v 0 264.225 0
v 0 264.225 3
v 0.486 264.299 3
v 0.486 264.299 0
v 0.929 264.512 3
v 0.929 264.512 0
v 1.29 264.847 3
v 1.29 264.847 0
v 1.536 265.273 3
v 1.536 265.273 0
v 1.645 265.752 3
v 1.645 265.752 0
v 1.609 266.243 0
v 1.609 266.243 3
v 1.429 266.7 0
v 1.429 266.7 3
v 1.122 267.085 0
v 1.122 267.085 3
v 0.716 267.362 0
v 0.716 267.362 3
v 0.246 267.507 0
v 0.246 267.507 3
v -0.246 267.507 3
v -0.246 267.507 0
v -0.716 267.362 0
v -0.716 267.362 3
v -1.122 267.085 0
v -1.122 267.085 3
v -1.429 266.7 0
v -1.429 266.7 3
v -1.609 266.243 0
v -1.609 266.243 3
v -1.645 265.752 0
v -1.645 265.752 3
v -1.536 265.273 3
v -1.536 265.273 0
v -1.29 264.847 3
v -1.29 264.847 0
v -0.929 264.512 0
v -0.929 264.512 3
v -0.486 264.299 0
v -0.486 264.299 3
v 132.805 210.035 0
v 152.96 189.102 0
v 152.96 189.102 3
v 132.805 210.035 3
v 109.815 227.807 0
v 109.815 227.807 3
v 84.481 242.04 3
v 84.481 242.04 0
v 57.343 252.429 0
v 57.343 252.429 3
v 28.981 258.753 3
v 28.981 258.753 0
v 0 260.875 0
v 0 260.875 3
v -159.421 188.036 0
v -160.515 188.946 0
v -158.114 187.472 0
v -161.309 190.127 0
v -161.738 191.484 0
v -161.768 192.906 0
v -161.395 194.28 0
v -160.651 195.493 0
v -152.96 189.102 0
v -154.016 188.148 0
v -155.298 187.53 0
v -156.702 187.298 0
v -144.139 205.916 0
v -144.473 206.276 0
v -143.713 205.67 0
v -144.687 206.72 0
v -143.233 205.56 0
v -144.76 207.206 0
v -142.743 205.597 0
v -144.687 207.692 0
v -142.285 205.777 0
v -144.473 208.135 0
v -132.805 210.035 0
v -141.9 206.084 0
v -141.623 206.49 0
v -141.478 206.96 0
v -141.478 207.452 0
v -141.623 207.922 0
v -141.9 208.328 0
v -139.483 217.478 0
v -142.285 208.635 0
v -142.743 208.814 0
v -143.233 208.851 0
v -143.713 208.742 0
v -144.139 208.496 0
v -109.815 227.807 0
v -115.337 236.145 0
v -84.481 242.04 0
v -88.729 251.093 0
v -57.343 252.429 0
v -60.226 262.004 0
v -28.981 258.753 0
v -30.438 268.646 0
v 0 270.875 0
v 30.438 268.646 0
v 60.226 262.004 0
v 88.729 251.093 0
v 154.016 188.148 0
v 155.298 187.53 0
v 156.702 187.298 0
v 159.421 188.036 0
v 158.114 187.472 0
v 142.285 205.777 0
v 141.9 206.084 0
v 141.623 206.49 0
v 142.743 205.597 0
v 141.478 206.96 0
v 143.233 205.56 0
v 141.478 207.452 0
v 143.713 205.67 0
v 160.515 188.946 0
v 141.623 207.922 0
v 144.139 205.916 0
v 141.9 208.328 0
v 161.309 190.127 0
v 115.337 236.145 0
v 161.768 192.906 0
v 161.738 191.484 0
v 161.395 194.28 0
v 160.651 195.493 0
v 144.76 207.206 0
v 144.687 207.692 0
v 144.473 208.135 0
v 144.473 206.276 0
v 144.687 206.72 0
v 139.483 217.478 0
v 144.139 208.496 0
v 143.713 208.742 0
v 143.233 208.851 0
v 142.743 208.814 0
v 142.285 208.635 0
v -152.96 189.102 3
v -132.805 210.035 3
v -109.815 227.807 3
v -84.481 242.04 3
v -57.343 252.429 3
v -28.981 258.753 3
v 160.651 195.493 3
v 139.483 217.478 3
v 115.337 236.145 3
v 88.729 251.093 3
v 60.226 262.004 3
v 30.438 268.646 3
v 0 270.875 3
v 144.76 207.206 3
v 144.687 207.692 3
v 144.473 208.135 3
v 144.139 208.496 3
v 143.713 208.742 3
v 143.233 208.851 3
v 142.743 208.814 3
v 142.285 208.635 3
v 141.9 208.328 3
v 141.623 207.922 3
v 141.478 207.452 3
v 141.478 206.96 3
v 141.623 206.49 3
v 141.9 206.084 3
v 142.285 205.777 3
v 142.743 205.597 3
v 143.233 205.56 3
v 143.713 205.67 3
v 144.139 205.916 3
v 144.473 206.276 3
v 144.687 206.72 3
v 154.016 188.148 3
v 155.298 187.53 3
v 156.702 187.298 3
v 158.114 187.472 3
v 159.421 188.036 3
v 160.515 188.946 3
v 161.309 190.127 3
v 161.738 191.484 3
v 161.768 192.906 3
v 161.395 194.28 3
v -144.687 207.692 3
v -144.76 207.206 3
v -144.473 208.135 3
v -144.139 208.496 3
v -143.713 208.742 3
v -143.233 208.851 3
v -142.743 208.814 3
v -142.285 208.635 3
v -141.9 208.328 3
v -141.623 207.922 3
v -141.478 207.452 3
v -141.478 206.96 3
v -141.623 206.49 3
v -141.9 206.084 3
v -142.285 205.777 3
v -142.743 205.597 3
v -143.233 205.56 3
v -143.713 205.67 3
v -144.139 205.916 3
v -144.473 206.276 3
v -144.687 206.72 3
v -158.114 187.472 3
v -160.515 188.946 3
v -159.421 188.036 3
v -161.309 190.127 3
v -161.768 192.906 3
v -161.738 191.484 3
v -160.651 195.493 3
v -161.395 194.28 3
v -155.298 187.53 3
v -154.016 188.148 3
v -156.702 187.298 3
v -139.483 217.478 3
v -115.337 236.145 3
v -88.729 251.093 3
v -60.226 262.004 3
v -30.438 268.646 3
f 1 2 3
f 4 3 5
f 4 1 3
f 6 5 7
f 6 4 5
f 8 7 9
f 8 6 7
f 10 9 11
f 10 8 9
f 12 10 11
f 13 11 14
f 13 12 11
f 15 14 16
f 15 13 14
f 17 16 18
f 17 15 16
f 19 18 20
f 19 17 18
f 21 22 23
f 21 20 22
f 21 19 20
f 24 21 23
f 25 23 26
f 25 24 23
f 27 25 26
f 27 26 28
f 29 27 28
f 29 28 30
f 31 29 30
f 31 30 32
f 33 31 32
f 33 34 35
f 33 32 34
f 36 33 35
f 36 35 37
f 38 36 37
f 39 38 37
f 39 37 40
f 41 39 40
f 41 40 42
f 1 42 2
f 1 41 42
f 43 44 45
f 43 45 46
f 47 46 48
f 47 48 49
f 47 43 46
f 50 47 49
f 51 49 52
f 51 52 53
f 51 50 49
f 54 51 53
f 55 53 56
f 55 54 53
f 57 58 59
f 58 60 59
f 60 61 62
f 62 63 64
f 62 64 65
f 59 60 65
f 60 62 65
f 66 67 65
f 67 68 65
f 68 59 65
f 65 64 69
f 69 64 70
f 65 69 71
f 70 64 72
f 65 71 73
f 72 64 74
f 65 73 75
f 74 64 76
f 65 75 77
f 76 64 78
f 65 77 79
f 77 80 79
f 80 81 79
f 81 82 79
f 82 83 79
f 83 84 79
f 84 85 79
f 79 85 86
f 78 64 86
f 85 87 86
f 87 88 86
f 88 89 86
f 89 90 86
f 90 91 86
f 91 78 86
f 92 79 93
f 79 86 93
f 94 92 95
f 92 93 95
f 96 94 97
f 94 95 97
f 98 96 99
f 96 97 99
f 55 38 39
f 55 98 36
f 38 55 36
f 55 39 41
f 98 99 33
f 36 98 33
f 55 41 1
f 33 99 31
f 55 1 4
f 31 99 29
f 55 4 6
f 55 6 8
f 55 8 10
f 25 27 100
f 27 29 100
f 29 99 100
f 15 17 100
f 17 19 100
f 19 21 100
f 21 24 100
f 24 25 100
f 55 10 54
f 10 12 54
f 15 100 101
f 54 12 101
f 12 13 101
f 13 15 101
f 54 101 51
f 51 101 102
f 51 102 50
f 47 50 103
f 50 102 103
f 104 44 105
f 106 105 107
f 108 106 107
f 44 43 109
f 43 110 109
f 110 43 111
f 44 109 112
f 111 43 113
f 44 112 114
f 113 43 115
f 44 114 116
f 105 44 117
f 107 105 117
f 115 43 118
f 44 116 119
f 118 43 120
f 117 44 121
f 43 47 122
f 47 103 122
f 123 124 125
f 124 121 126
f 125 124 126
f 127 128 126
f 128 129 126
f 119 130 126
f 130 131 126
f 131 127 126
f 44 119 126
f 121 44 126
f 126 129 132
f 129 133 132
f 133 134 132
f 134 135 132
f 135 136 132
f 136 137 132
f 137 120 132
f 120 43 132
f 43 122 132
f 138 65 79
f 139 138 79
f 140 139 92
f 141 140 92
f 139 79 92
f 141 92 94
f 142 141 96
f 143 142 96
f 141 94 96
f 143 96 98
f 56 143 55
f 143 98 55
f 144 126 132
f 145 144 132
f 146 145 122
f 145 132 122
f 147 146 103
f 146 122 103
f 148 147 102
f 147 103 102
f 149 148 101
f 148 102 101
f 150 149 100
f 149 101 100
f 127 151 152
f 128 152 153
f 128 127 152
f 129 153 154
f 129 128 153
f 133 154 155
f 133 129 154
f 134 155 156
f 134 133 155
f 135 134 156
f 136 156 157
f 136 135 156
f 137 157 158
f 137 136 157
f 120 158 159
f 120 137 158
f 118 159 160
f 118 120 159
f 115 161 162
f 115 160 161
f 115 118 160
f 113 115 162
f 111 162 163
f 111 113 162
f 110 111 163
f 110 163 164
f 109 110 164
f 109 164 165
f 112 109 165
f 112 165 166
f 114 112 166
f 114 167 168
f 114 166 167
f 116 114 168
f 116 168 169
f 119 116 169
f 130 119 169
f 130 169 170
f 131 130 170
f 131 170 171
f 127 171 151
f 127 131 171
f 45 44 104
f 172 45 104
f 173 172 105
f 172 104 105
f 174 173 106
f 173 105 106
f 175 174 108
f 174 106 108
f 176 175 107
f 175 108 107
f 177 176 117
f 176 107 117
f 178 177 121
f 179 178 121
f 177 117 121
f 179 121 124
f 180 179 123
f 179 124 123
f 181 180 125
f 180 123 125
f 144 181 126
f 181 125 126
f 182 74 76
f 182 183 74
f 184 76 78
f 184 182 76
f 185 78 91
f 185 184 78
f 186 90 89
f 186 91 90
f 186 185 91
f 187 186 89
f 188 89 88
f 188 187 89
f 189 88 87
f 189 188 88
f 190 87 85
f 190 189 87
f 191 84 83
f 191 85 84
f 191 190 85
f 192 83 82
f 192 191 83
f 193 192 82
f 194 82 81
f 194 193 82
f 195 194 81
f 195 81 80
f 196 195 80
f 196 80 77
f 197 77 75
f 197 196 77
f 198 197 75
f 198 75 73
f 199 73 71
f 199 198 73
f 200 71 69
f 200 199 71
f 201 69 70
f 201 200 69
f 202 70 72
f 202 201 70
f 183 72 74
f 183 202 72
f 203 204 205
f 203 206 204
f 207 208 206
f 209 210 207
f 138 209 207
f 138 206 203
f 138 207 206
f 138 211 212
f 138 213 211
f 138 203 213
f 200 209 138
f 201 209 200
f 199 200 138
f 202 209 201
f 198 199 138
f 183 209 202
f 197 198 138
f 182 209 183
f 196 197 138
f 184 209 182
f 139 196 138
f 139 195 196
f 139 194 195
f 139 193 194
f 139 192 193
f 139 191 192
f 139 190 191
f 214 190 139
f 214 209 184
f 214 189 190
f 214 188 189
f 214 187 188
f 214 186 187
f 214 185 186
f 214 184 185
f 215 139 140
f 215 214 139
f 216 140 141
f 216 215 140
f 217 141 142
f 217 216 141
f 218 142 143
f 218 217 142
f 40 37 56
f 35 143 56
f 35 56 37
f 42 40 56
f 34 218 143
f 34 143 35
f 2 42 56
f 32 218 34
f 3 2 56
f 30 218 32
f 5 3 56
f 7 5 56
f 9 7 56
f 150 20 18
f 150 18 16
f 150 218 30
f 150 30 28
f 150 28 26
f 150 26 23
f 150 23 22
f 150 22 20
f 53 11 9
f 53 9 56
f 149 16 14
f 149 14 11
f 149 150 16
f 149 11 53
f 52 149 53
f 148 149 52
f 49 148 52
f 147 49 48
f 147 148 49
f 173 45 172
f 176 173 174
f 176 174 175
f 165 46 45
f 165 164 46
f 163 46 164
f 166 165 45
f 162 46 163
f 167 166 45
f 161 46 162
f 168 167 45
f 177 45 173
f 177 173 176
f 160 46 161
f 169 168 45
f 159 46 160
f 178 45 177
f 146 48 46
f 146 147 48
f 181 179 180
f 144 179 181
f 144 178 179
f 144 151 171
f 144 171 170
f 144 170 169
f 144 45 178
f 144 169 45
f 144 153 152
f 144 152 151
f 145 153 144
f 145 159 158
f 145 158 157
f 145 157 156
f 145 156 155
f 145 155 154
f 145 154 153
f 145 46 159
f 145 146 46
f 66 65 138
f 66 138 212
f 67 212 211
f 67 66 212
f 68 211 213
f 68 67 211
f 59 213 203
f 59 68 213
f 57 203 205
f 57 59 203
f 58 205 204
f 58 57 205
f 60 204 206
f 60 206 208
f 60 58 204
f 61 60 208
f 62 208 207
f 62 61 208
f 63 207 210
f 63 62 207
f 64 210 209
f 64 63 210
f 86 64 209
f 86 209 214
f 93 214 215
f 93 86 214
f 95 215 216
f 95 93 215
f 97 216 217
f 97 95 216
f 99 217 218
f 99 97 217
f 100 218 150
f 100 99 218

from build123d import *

# Parameters (mm, degrees)
PAD014_DEPTH                        = 3
SKETCH055_R                         = 1.65
POCKET019_DEPTH                     = 364.282338
POCKET019_DEPTH_BACK                = 367.282338
BODY001003005003003_PLACEMENT_ANGLE = 60
CLONE021_PLACEMENT_ANGLE            = 60


with BuildPart() as part:
    # Sketch052 → Pad014 (new body)
    with BuildSketch(Plane.XY):
        with BuildLine():
            ThreePointArc((152.959511, 127.101705), (84.480895, 180.040089), (0, 198.875477))
            Line((0, 198.875477), (0, 208.875477))
            ThreePointArc((160.650731, 133.492724), (88.728824, 189.092995), (0, 208.875477))
            ThreePointArc((152.959511, 127.101705), (160.000631, 126.451604), (160.650731, 133.492724))
        make_face()
    pad014 = extrude(amount=PAD014_DEPTH)

    # Sketch055 → Pocket019 (cut, two sides)
    with BuildSketch(Plane.XY) as pocket019_sk:
        with Locations((143.11, 145.205847)):
            Circle(SKETCH055_R)
        with BuildLine():
            Line((0, 202.225477), (0, 205.525477))
            ThreePointArc((0, 202.225477), (1.65, 203.875477), (0, 205.525477))
        make_face()
    pocket019 = extrude(amount=-POCKET019_DEPTH, mode=Mode.SUBTRACT) + extrude(pocket019_sk.sketch, amount=POCKET019_DEPTH_BACK, mode=Mode.SUBTRACT)

    # Mirrored019: Pad014, Pocket019 across Sketch052 V_Axis
    add(pad014.mirror(Plane(origin=(0, 0, 0), x_dir=(0, 0, 1), z_dir=(1, 0, 0))))
    add(pocket019.mirror(Plane(origin=(0, 0, 0), x_dir=(0, 0, 1), z_dir=(1, 0, 0))), mode=Mode.SUBTRACT)


with BuildPart() as part_1:
    # Body001003005003003 placement: moved
    add(part.part.rotate(Axis((0, 0, 0), (0, 0, 1)), BODY001003005003003_PLACEMENT_ANGLE))


with BuildPart() as part_2:
    # Clone021 placement: moved
    add(part_1.part.moved(Location((0, 62, 0))).rotate(Axis((0, 62, 0), (0, 0, -1)), CLONE021_PLACEMENT_ANGLE))


solid = part_2.part
